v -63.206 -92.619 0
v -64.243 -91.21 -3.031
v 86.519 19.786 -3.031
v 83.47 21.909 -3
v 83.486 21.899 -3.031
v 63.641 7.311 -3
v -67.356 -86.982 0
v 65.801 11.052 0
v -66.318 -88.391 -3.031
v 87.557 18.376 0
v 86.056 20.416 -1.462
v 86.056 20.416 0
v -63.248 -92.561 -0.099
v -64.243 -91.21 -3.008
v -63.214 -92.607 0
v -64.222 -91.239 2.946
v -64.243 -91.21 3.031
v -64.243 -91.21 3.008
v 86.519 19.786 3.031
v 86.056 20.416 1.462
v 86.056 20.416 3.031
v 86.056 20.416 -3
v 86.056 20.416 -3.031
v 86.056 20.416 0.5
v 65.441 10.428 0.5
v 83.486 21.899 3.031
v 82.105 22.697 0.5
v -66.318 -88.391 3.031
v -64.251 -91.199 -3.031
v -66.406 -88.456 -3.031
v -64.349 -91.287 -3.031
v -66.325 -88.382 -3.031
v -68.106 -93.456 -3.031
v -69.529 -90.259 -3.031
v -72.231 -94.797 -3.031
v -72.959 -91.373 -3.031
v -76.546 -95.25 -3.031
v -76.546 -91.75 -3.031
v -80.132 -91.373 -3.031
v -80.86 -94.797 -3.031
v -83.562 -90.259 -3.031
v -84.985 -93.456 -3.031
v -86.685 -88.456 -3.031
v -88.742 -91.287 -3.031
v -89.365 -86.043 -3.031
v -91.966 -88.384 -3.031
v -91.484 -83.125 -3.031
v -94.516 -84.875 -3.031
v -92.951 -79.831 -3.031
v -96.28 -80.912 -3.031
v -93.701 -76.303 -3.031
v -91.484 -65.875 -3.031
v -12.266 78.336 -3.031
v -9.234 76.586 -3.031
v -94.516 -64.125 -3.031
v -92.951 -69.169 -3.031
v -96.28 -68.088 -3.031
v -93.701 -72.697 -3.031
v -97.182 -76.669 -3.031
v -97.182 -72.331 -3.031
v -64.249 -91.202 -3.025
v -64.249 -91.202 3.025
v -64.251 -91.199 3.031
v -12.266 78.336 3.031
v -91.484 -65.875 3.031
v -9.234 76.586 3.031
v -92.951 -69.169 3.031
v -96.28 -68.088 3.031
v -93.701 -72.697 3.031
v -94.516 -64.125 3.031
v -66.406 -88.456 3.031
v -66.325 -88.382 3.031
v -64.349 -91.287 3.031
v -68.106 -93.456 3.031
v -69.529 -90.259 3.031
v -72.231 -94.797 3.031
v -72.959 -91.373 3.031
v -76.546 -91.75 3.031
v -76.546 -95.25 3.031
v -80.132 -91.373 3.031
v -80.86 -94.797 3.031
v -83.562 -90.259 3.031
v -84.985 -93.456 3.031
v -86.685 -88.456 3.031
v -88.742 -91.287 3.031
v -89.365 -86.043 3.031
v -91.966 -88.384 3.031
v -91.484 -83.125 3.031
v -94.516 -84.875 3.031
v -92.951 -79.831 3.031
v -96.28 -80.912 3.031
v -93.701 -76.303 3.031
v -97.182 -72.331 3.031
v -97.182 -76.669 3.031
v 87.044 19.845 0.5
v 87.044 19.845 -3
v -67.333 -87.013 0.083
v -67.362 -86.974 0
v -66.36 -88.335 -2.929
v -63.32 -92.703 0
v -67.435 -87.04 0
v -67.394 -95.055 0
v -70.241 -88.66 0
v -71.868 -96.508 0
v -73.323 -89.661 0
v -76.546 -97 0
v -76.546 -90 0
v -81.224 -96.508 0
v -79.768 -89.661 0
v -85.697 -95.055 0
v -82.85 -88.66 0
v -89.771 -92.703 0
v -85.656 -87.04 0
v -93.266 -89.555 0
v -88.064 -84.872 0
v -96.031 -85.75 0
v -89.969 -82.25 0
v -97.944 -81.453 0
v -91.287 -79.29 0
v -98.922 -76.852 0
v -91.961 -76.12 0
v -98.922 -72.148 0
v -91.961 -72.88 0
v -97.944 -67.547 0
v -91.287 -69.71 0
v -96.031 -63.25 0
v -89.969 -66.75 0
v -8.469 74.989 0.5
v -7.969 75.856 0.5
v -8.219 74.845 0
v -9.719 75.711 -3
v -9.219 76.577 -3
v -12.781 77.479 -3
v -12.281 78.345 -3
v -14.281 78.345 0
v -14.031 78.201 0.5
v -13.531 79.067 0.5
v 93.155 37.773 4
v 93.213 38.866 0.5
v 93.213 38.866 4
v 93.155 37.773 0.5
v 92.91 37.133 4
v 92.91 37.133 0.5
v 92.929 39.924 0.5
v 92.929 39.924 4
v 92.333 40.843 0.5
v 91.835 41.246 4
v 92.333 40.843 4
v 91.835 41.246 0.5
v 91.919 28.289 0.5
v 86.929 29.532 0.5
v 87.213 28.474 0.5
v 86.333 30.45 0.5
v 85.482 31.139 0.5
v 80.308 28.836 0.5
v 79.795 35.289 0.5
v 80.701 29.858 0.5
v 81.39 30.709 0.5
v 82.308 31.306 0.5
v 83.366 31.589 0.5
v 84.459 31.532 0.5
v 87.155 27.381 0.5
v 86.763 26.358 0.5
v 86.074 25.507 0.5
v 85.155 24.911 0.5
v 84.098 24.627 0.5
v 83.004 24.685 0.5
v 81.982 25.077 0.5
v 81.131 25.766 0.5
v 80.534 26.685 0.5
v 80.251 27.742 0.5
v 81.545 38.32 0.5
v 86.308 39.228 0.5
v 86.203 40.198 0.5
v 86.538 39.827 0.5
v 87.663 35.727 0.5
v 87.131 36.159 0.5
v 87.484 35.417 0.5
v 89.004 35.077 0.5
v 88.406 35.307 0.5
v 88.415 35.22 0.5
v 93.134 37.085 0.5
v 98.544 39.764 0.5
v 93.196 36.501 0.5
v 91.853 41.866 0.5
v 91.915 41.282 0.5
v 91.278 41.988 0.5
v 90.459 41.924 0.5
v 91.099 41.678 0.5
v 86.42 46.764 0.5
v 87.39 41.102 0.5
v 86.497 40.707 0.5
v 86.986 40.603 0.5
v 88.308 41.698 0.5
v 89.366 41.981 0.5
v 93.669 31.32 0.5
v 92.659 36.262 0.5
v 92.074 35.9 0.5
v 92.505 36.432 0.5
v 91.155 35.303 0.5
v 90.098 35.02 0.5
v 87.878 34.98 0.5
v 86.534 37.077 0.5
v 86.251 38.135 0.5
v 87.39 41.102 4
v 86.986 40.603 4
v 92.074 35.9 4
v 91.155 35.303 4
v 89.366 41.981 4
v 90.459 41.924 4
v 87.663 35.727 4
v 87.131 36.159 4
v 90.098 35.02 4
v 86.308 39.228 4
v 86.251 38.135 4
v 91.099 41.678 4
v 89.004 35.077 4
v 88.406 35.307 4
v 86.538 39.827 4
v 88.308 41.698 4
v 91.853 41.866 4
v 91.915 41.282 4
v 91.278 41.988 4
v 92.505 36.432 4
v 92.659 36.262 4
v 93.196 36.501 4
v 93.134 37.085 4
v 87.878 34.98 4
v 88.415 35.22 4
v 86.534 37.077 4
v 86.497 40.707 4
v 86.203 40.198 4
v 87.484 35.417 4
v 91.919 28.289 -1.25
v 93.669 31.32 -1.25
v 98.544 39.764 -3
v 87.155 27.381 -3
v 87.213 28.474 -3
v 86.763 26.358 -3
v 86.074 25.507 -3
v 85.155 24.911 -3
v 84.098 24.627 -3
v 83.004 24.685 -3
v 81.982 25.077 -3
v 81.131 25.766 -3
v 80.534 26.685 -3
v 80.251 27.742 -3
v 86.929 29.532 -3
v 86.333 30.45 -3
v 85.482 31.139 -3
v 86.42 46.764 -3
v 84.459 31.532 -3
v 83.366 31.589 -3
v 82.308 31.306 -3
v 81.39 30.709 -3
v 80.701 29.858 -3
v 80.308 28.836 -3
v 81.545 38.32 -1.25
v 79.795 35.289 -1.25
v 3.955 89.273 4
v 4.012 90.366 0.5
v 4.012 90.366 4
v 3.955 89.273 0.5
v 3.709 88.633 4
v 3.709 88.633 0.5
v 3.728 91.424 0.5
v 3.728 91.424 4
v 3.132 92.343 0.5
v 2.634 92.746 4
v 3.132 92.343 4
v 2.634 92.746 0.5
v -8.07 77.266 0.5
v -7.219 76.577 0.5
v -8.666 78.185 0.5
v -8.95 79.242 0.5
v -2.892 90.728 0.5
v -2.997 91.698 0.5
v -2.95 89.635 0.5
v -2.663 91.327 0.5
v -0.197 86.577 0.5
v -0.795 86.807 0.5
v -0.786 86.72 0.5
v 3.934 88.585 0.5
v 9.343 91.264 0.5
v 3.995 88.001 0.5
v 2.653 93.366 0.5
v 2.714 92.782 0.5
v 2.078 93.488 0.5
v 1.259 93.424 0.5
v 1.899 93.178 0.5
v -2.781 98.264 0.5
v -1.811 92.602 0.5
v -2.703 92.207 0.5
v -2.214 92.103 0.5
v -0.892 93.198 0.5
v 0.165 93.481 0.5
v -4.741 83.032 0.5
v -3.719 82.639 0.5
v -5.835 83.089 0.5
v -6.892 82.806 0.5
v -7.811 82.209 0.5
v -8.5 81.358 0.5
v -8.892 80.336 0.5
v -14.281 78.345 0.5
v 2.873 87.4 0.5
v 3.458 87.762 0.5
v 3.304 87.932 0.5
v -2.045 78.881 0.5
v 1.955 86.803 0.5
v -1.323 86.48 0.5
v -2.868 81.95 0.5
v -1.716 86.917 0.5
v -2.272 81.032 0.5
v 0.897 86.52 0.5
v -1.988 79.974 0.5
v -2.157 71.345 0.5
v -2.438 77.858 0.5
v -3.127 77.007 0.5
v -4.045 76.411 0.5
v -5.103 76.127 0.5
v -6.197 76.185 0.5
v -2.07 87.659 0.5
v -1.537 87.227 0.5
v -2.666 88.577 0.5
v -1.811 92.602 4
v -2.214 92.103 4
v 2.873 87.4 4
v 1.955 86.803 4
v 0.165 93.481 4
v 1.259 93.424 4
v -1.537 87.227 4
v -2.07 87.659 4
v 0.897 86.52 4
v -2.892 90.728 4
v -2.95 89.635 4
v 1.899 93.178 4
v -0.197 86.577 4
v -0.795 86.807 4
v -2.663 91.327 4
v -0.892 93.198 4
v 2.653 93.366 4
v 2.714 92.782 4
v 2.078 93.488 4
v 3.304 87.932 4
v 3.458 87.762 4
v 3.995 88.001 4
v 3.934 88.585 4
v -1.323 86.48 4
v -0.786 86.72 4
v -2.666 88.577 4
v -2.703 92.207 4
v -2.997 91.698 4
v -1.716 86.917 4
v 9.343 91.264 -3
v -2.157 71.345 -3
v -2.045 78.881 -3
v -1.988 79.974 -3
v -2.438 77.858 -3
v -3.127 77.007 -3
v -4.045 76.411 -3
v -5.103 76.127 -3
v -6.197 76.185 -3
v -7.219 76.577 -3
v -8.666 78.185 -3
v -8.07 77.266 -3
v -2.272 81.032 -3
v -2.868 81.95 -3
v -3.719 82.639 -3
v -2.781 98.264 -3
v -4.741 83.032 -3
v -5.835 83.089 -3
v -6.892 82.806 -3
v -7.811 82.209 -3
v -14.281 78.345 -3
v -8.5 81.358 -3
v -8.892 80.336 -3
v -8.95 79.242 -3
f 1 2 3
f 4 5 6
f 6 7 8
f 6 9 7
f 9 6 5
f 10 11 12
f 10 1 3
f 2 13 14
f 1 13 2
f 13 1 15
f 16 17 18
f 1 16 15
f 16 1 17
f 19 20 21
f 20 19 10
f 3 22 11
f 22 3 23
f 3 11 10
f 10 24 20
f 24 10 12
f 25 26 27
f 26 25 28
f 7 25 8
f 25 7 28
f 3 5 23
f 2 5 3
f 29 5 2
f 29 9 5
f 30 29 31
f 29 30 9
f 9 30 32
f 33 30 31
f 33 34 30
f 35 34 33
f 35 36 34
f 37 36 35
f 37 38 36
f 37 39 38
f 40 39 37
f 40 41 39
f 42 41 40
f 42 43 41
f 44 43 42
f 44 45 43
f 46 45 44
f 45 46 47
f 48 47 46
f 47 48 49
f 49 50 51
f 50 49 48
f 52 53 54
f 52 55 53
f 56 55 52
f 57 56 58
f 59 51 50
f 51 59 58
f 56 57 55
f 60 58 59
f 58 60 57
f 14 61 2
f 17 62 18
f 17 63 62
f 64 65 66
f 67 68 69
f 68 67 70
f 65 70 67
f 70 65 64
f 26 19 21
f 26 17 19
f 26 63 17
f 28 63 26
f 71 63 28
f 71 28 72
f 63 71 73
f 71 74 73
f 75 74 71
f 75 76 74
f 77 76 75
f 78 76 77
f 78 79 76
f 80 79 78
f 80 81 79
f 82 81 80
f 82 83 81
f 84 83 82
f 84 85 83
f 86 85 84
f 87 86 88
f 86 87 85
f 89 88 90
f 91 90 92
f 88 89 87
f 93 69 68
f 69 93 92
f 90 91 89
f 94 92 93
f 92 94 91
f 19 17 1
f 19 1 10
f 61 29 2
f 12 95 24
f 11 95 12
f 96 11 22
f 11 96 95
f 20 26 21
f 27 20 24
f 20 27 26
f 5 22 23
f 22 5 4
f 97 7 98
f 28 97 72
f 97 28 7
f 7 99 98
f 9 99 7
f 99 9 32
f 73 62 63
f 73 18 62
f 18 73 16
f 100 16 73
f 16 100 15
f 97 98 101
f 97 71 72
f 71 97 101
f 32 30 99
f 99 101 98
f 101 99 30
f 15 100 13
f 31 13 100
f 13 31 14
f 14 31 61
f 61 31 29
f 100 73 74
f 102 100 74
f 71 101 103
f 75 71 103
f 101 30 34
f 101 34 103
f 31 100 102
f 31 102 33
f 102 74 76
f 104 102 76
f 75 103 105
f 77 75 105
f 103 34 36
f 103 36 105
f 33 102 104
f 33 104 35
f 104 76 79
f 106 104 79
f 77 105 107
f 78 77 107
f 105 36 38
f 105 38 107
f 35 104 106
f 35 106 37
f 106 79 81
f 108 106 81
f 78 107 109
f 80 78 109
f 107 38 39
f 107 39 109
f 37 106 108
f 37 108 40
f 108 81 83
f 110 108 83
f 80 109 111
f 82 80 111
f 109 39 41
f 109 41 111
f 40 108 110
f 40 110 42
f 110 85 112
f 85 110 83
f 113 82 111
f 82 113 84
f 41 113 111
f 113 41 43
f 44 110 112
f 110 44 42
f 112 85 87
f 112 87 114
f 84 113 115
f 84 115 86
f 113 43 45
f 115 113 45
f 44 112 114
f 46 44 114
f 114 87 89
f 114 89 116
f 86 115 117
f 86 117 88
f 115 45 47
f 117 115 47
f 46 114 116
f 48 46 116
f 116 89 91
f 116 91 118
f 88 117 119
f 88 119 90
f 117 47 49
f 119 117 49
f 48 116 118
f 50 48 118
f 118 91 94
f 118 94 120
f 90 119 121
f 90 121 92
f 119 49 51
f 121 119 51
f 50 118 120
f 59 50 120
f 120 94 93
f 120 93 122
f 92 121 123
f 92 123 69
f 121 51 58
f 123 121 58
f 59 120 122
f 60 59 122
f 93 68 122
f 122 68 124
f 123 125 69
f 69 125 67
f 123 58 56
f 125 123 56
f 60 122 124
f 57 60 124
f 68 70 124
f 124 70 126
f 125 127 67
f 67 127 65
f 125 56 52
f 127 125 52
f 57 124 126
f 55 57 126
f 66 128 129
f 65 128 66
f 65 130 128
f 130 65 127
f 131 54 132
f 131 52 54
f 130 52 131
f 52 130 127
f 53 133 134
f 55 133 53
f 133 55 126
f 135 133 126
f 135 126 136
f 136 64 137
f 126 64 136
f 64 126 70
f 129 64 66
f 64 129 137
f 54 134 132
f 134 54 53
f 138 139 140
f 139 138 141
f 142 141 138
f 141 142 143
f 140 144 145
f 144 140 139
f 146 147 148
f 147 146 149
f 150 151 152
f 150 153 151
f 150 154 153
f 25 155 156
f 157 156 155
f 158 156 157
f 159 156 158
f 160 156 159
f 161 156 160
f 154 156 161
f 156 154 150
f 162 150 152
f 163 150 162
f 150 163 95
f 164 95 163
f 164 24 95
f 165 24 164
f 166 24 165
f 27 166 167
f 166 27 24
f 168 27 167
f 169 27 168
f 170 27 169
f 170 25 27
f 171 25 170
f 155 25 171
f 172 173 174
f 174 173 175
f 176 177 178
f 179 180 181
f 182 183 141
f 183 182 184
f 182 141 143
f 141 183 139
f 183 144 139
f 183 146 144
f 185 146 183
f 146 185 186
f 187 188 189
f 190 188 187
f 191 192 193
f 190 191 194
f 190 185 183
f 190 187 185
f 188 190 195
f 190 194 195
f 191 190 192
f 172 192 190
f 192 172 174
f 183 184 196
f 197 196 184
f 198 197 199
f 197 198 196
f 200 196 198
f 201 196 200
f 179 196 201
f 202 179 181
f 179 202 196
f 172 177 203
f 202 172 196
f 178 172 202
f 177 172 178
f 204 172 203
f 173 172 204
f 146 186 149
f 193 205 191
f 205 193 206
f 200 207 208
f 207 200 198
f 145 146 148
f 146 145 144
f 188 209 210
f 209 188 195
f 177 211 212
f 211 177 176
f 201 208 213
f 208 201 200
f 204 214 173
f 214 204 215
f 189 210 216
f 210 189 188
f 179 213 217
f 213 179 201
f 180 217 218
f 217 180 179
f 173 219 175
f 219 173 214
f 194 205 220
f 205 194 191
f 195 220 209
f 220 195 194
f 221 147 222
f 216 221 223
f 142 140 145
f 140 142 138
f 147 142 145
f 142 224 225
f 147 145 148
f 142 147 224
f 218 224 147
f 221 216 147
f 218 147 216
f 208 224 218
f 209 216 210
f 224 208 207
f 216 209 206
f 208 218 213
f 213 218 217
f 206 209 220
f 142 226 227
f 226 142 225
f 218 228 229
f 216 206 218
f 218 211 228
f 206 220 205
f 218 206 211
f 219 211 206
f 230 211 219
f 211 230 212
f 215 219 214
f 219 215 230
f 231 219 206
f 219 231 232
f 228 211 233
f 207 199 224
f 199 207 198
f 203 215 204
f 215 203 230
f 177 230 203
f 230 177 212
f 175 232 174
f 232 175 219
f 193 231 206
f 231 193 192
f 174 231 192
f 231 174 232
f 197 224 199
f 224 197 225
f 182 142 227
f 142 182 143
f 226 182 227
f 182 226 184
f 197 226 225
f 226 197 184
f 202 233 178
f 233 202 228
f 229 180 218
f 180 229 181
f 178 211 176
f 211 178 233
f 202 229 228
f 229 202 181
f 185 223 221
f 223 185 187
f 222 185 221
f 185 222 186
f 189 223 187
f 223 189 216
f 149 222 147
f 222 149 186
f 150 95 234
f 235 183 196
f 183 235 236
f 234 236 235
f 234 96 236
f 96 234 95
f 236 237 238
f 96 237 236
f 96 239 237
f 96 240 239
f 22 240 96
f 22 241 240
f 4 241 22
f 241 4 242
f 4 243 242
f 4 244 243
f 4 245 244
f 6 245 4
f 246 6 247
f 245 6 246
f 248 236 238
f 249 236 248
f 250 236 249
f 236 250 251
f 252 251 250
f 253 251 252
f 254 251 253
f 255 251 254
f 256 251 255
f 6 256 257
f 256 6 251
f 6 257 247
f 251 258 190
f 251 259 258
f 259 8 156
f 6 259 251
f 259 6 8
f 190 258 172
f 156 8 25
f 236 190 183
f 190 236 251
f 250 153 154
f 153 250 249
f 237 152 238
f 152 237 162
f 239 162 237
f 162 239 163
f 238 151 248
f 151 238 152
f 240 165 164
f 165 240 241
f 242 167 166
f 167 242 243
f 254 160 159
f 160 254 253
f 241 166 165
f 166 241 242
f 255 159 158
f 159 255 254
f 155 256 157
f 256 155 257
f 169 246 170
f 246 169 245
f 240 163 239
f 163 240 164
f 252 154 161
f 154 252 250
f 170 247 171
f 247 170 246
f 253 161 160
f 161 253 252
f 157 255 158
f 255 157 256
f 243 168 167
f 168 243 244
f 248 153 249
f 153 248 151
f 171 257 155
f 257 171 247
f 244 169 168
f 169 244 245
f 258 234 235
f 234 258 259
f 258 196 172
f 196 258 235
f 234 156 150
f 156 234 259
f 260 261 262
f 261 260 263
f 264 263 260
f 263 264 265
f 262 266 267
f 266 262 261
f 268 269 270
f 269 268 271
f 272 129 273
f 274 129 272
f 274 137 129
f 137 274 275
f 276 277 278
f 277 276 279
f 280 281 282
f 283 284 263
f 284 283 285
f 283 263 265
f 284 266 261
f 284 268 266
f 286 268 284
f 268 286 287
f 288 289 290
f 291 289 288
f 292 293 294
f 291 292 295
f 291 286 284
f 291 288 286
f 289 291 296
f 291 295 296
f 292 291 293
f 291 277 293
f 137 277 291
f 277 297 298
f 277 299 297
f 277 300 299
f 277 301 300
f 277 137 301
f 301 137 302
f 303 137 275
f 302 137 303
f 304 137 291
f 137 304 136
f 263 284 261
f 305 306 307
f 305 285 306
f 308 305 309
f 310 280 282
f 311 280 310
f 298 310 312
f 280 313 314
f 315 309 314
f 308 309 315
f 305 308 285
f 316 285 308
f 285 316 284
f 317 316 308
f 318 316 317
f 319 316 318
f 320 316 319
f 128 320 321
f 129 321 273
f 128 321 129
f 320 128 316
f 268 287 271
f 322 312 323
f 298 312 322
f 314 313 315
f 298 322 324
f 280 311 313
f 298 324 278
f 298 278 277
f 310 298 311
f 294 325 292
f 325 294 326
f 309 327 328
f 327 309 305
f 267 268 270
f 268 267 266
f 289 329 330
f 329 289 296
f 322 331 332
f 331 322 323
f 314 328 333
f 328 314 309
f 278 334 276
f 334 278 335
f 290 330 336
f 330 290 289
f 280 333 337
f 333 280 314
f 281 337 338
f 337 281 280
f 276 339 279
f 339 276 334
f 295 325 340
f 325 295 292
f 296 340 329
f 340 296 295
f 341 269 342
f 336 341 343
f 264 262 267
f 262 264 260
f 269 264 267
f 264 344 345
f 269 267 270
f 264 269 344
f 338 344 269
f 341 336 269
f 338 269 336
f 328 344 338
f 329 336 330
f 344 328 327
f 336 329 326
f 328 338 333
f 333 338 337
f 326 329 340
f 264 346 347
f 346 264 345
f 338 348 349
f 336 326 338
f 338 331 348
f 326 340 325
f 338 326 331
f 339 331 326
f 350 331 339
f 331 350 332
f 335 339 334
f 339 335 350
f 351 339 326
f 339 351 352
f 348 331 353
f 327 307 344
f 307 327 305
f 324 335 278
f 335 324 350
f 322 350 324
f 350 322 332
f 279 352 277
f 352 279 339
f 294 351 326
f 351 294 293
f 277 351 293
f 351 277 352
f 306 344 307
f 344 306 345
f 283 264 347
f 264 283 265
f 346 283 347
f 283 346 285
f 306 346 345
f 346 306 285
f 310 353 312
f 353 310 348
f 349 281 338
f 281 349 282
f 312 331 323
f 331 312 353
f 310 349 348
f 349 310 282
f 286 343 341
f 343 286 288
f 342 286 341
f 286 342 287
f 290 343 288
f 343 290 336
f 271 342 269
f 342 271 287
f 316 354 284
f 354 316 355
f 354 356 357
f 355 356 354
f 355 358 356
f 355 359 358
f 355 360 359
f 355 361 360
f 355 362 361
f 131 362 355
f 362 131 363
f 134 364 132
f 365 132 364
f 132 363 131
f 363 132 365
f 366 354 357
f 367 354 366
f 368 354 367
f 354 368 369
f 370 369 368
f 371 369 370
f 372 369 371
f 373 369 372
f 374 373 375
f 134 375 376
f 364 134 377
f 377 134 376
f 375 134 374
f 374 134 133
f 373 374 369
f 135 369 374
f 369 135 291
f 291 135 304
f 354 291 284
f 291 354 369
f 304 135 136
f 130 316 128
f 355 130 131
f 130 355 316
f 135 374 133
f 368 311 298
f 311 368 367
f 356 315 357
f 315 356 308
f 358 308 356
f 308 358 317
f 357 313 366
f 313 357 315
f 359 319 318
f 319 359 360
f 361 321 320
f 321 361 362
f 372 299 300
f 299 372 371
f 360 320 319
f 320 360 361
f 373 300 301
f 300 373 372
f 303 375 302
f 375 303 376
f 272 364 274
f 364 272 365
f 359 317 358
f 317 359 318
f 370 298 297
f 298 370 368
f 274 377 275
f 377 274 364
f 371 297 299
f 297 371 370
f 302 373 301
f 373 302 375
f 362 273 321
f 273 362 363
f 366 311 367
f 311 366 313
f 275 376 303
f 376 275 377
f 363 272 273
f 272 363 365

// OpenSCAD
length = 390;
height = 110;

bar_d = 7;
bar_r = bar_d / 2;

bend_d = 38;
bend_r = bend_d / 2;

pin_d = bar_d;
pin_buffer = 5;
plate_h = pin_d * 2 + pin_buffer + 4;

bottom_l = length /2 - bend_r - plate_h / 2;

corner_a = atan((height - bend_d)/ bottom_l);

top_l = sqrt((bottom_l + tan(corner_a)*bend_r) * (bottom_l + tan(corner_a)*bend_r) + (height - bend_d)*(height - bend_d));


bend_a = 180 - corner_a;


plate_w = pin_d * 2;

hook_d = 57;
hook_r = hook_d / 2;

module ring(outer, inner) {
	rotate_extrude() translate([inner, 0, 0]) circle(r = outer, $fn = 6);
}

module partial_ring(outer, inner, deg) {
  assign(compliment = 360 - deg) {

    difference() {
      ring(outer, inner);

      if (compliment < 90) {
        translate([0, 0, -outer])
          linear_extrude(height = outer * 2)
            polygon(points = [[0,0],
                              [-(inner + outer), 0], 
                              [-(inner + outer),(inner + outer) * tan(compliment)]]);
      }
      else if (compliment < 180) {
        translate([-(inner + outer), 0, -outer])
          cube(size = [inner + outer, inner + outer, outer*2], center = false);

        translate([0, 0, -outer])
        linear_extrude(height = outer * 2)
          polygon(points = [[0,0],
                            [0, (inner + outer)], 
                            [(inner + outer) * tan(compliment - 90),
				(inner + outer),]]);
      }
      else if (compliment < 270) {
        translate([-(inner + outer), 0, -outer])
          cube(size = [(inner + outer)*2, inner + outer, outer*2], center = false);

        translate([0, 0, -outer])
        linear_extrude(height = outer * 2)
          polygon(points = [[0,0],
                            [(inner + outer), 0], 
                            [(inner + outer),
				-(inner + outer) * tan(compliment - 180)]]);

      }
      else {
        translate([-(inner + outer), 0, -outer])
          cube(size = [(inner + outer)*2, inner + outer, outer*2], center = false);

	translate([0, -(inner + outer), -outer])
	  cube(size = [inner + outer, inner + outer, outer*2], center = false);
	  
        translate([0, 0, -outer])
        linear_extrude(height = outer * 2)
          polygon(points = [[0,0],
                            [0, -(inner + outer)], 
                            [(inner + outer) * tan(90 - (compliment - 180)),
                              -(inner + outer)]]);
      }
    }
  }
}

module pin(height, rad) {
  union() {
    cylinder(h = height, r = rad, center = false, $fn = 20);
    translate([-rad, 0, 0])
      cylinder(h = height, r = 0.5, center = false, $fn = 5);
    translate([rad, 0, 0])
      cylinder(h = height, r = 0.5, center = false, $fn = 5);
    translate([0, -rad, 0])
      cylinder(h = height, r = 0.5, center = false, $fn = 5);
    translate([0, rad, 0])
      cylinder(h = height, r = 0.5, center = false, $fn = 5);
  }
}

module pinplate(plate_t, num_pins, pin_d) {
  assign(plate_w = pin_d * (num_pins * 2),
  
         pin_r = pin_d / 2) {

    difference() {
      union() {
        cube(size = [plate_w, plate_h, plate_t], center=false);
        for (i = [0:num_pins - 1]) {
          translate([pin_d + pin_d * i * 2, pin_d + pin_r + pin_buffer + 2, plate_t])
            pin(plate_t, pin_r);
        }
      }    

      for (i = [0:num_pins - 1]) {
	translate([pin_d + pin_d * i * 2, pin_r + 2, -1])
        cylinder(h = plate_t + 2, r = pin_r, center = false, $fn = 20);

/*	rotate(a = [0, 180, 0])
          pinhole(h = plate_t, r = pin_r, lh = plate_t / 3, lt = 1,
	          t = 0.3, tight = true);*/
      }
    }  
  }
}	   

module hangerside() {
  rotate(a = [270, 0, 0]) {
  cylinder(h=bottom_l, r = bar_r, $fn = 6);

  difference() {
    translate([bend_r, 0, 0])
      rotate(a = [0, corner_a, 0])
      translate([bend_r, 0, 0])
      cylinder(h=top_l, r = bar_r, $fn = 6);

    translate([height - 1 - bar_r, -bar_r, bottom_l - 1])
      cube(size = bar_d + 2);
  }


  translate([bend_r, 0, 0])
    rotate([90, 0, 0]) partial_ring(bar_r, bend_r, bend_a);
  }

  translate([height - bar_r * 3, bottom_l - 1, -bar_r + .5]){
    difference() {
      pinplate(bar_r, 1, pin_d);
      translate([-1, plate_h/2 - bar_r/2 , bar_r/2])
        cube(size = [plate_w + 2, bar_r, bar_r / 2 + 1], center=false);
  }
  linear_extrude(height = bar_r)
     polygon(points = [[0,0], [bar_r * 3, 0], [0, (1/tan(corner_a))* -(bar_r * 3)]]);
  }

  translate([-bar_r, bottom_l - 1, -bar_r + .5])
    pinplate(bar_r, 1, pin_d);
}

module hangerhook() {
  rotate(a = [-90, 0, -90]) {
  translate([0, 0.5, hook_r]) {
    translate([0, 0, hook_r])
      rotate(a = [-90, 0, 0])
      partial_ring(bar_r, hook_r, 180);

    translate([hook_r, 0, -1])
      cylinder(r = bar_r, h = hook_r + 2, $fn = 6);

    rotate(a = [90, 0, 180])
      partial_ring(bar_r, hook_r, 90);
  }
  translate([0, 0, -1])
  cube(size = [plate_h, bar_d, bar_r], center = true);
  translate([0, bar_r/2 + 0.3, -(plate_w + bar_d) / 2 + 1])
    cube(size = [bar_r - 0.5, bar_r - 0.5, plate_w + 3], center = true);
  translate([0, 0, -(plate_w + bar_r + 2)])
    cube(size = [plate_h, bar_d, bar_r], center = true);
  }
}

/**** Uncomment one of either the hanger side or hook ****/


//Uncomment to render a guide outline for mendel bed
/*difference() {
  cube(size = [200, 200, 1], center=true);
  cube(size = [198, 198, 3], center=true);
}*/

//Uncomment to render the hook
//hangerhook();

//Uncomment to render one side
translate([-93, -65, 0])
  rotate(a = [0, 0, -30])
  hangerside();
